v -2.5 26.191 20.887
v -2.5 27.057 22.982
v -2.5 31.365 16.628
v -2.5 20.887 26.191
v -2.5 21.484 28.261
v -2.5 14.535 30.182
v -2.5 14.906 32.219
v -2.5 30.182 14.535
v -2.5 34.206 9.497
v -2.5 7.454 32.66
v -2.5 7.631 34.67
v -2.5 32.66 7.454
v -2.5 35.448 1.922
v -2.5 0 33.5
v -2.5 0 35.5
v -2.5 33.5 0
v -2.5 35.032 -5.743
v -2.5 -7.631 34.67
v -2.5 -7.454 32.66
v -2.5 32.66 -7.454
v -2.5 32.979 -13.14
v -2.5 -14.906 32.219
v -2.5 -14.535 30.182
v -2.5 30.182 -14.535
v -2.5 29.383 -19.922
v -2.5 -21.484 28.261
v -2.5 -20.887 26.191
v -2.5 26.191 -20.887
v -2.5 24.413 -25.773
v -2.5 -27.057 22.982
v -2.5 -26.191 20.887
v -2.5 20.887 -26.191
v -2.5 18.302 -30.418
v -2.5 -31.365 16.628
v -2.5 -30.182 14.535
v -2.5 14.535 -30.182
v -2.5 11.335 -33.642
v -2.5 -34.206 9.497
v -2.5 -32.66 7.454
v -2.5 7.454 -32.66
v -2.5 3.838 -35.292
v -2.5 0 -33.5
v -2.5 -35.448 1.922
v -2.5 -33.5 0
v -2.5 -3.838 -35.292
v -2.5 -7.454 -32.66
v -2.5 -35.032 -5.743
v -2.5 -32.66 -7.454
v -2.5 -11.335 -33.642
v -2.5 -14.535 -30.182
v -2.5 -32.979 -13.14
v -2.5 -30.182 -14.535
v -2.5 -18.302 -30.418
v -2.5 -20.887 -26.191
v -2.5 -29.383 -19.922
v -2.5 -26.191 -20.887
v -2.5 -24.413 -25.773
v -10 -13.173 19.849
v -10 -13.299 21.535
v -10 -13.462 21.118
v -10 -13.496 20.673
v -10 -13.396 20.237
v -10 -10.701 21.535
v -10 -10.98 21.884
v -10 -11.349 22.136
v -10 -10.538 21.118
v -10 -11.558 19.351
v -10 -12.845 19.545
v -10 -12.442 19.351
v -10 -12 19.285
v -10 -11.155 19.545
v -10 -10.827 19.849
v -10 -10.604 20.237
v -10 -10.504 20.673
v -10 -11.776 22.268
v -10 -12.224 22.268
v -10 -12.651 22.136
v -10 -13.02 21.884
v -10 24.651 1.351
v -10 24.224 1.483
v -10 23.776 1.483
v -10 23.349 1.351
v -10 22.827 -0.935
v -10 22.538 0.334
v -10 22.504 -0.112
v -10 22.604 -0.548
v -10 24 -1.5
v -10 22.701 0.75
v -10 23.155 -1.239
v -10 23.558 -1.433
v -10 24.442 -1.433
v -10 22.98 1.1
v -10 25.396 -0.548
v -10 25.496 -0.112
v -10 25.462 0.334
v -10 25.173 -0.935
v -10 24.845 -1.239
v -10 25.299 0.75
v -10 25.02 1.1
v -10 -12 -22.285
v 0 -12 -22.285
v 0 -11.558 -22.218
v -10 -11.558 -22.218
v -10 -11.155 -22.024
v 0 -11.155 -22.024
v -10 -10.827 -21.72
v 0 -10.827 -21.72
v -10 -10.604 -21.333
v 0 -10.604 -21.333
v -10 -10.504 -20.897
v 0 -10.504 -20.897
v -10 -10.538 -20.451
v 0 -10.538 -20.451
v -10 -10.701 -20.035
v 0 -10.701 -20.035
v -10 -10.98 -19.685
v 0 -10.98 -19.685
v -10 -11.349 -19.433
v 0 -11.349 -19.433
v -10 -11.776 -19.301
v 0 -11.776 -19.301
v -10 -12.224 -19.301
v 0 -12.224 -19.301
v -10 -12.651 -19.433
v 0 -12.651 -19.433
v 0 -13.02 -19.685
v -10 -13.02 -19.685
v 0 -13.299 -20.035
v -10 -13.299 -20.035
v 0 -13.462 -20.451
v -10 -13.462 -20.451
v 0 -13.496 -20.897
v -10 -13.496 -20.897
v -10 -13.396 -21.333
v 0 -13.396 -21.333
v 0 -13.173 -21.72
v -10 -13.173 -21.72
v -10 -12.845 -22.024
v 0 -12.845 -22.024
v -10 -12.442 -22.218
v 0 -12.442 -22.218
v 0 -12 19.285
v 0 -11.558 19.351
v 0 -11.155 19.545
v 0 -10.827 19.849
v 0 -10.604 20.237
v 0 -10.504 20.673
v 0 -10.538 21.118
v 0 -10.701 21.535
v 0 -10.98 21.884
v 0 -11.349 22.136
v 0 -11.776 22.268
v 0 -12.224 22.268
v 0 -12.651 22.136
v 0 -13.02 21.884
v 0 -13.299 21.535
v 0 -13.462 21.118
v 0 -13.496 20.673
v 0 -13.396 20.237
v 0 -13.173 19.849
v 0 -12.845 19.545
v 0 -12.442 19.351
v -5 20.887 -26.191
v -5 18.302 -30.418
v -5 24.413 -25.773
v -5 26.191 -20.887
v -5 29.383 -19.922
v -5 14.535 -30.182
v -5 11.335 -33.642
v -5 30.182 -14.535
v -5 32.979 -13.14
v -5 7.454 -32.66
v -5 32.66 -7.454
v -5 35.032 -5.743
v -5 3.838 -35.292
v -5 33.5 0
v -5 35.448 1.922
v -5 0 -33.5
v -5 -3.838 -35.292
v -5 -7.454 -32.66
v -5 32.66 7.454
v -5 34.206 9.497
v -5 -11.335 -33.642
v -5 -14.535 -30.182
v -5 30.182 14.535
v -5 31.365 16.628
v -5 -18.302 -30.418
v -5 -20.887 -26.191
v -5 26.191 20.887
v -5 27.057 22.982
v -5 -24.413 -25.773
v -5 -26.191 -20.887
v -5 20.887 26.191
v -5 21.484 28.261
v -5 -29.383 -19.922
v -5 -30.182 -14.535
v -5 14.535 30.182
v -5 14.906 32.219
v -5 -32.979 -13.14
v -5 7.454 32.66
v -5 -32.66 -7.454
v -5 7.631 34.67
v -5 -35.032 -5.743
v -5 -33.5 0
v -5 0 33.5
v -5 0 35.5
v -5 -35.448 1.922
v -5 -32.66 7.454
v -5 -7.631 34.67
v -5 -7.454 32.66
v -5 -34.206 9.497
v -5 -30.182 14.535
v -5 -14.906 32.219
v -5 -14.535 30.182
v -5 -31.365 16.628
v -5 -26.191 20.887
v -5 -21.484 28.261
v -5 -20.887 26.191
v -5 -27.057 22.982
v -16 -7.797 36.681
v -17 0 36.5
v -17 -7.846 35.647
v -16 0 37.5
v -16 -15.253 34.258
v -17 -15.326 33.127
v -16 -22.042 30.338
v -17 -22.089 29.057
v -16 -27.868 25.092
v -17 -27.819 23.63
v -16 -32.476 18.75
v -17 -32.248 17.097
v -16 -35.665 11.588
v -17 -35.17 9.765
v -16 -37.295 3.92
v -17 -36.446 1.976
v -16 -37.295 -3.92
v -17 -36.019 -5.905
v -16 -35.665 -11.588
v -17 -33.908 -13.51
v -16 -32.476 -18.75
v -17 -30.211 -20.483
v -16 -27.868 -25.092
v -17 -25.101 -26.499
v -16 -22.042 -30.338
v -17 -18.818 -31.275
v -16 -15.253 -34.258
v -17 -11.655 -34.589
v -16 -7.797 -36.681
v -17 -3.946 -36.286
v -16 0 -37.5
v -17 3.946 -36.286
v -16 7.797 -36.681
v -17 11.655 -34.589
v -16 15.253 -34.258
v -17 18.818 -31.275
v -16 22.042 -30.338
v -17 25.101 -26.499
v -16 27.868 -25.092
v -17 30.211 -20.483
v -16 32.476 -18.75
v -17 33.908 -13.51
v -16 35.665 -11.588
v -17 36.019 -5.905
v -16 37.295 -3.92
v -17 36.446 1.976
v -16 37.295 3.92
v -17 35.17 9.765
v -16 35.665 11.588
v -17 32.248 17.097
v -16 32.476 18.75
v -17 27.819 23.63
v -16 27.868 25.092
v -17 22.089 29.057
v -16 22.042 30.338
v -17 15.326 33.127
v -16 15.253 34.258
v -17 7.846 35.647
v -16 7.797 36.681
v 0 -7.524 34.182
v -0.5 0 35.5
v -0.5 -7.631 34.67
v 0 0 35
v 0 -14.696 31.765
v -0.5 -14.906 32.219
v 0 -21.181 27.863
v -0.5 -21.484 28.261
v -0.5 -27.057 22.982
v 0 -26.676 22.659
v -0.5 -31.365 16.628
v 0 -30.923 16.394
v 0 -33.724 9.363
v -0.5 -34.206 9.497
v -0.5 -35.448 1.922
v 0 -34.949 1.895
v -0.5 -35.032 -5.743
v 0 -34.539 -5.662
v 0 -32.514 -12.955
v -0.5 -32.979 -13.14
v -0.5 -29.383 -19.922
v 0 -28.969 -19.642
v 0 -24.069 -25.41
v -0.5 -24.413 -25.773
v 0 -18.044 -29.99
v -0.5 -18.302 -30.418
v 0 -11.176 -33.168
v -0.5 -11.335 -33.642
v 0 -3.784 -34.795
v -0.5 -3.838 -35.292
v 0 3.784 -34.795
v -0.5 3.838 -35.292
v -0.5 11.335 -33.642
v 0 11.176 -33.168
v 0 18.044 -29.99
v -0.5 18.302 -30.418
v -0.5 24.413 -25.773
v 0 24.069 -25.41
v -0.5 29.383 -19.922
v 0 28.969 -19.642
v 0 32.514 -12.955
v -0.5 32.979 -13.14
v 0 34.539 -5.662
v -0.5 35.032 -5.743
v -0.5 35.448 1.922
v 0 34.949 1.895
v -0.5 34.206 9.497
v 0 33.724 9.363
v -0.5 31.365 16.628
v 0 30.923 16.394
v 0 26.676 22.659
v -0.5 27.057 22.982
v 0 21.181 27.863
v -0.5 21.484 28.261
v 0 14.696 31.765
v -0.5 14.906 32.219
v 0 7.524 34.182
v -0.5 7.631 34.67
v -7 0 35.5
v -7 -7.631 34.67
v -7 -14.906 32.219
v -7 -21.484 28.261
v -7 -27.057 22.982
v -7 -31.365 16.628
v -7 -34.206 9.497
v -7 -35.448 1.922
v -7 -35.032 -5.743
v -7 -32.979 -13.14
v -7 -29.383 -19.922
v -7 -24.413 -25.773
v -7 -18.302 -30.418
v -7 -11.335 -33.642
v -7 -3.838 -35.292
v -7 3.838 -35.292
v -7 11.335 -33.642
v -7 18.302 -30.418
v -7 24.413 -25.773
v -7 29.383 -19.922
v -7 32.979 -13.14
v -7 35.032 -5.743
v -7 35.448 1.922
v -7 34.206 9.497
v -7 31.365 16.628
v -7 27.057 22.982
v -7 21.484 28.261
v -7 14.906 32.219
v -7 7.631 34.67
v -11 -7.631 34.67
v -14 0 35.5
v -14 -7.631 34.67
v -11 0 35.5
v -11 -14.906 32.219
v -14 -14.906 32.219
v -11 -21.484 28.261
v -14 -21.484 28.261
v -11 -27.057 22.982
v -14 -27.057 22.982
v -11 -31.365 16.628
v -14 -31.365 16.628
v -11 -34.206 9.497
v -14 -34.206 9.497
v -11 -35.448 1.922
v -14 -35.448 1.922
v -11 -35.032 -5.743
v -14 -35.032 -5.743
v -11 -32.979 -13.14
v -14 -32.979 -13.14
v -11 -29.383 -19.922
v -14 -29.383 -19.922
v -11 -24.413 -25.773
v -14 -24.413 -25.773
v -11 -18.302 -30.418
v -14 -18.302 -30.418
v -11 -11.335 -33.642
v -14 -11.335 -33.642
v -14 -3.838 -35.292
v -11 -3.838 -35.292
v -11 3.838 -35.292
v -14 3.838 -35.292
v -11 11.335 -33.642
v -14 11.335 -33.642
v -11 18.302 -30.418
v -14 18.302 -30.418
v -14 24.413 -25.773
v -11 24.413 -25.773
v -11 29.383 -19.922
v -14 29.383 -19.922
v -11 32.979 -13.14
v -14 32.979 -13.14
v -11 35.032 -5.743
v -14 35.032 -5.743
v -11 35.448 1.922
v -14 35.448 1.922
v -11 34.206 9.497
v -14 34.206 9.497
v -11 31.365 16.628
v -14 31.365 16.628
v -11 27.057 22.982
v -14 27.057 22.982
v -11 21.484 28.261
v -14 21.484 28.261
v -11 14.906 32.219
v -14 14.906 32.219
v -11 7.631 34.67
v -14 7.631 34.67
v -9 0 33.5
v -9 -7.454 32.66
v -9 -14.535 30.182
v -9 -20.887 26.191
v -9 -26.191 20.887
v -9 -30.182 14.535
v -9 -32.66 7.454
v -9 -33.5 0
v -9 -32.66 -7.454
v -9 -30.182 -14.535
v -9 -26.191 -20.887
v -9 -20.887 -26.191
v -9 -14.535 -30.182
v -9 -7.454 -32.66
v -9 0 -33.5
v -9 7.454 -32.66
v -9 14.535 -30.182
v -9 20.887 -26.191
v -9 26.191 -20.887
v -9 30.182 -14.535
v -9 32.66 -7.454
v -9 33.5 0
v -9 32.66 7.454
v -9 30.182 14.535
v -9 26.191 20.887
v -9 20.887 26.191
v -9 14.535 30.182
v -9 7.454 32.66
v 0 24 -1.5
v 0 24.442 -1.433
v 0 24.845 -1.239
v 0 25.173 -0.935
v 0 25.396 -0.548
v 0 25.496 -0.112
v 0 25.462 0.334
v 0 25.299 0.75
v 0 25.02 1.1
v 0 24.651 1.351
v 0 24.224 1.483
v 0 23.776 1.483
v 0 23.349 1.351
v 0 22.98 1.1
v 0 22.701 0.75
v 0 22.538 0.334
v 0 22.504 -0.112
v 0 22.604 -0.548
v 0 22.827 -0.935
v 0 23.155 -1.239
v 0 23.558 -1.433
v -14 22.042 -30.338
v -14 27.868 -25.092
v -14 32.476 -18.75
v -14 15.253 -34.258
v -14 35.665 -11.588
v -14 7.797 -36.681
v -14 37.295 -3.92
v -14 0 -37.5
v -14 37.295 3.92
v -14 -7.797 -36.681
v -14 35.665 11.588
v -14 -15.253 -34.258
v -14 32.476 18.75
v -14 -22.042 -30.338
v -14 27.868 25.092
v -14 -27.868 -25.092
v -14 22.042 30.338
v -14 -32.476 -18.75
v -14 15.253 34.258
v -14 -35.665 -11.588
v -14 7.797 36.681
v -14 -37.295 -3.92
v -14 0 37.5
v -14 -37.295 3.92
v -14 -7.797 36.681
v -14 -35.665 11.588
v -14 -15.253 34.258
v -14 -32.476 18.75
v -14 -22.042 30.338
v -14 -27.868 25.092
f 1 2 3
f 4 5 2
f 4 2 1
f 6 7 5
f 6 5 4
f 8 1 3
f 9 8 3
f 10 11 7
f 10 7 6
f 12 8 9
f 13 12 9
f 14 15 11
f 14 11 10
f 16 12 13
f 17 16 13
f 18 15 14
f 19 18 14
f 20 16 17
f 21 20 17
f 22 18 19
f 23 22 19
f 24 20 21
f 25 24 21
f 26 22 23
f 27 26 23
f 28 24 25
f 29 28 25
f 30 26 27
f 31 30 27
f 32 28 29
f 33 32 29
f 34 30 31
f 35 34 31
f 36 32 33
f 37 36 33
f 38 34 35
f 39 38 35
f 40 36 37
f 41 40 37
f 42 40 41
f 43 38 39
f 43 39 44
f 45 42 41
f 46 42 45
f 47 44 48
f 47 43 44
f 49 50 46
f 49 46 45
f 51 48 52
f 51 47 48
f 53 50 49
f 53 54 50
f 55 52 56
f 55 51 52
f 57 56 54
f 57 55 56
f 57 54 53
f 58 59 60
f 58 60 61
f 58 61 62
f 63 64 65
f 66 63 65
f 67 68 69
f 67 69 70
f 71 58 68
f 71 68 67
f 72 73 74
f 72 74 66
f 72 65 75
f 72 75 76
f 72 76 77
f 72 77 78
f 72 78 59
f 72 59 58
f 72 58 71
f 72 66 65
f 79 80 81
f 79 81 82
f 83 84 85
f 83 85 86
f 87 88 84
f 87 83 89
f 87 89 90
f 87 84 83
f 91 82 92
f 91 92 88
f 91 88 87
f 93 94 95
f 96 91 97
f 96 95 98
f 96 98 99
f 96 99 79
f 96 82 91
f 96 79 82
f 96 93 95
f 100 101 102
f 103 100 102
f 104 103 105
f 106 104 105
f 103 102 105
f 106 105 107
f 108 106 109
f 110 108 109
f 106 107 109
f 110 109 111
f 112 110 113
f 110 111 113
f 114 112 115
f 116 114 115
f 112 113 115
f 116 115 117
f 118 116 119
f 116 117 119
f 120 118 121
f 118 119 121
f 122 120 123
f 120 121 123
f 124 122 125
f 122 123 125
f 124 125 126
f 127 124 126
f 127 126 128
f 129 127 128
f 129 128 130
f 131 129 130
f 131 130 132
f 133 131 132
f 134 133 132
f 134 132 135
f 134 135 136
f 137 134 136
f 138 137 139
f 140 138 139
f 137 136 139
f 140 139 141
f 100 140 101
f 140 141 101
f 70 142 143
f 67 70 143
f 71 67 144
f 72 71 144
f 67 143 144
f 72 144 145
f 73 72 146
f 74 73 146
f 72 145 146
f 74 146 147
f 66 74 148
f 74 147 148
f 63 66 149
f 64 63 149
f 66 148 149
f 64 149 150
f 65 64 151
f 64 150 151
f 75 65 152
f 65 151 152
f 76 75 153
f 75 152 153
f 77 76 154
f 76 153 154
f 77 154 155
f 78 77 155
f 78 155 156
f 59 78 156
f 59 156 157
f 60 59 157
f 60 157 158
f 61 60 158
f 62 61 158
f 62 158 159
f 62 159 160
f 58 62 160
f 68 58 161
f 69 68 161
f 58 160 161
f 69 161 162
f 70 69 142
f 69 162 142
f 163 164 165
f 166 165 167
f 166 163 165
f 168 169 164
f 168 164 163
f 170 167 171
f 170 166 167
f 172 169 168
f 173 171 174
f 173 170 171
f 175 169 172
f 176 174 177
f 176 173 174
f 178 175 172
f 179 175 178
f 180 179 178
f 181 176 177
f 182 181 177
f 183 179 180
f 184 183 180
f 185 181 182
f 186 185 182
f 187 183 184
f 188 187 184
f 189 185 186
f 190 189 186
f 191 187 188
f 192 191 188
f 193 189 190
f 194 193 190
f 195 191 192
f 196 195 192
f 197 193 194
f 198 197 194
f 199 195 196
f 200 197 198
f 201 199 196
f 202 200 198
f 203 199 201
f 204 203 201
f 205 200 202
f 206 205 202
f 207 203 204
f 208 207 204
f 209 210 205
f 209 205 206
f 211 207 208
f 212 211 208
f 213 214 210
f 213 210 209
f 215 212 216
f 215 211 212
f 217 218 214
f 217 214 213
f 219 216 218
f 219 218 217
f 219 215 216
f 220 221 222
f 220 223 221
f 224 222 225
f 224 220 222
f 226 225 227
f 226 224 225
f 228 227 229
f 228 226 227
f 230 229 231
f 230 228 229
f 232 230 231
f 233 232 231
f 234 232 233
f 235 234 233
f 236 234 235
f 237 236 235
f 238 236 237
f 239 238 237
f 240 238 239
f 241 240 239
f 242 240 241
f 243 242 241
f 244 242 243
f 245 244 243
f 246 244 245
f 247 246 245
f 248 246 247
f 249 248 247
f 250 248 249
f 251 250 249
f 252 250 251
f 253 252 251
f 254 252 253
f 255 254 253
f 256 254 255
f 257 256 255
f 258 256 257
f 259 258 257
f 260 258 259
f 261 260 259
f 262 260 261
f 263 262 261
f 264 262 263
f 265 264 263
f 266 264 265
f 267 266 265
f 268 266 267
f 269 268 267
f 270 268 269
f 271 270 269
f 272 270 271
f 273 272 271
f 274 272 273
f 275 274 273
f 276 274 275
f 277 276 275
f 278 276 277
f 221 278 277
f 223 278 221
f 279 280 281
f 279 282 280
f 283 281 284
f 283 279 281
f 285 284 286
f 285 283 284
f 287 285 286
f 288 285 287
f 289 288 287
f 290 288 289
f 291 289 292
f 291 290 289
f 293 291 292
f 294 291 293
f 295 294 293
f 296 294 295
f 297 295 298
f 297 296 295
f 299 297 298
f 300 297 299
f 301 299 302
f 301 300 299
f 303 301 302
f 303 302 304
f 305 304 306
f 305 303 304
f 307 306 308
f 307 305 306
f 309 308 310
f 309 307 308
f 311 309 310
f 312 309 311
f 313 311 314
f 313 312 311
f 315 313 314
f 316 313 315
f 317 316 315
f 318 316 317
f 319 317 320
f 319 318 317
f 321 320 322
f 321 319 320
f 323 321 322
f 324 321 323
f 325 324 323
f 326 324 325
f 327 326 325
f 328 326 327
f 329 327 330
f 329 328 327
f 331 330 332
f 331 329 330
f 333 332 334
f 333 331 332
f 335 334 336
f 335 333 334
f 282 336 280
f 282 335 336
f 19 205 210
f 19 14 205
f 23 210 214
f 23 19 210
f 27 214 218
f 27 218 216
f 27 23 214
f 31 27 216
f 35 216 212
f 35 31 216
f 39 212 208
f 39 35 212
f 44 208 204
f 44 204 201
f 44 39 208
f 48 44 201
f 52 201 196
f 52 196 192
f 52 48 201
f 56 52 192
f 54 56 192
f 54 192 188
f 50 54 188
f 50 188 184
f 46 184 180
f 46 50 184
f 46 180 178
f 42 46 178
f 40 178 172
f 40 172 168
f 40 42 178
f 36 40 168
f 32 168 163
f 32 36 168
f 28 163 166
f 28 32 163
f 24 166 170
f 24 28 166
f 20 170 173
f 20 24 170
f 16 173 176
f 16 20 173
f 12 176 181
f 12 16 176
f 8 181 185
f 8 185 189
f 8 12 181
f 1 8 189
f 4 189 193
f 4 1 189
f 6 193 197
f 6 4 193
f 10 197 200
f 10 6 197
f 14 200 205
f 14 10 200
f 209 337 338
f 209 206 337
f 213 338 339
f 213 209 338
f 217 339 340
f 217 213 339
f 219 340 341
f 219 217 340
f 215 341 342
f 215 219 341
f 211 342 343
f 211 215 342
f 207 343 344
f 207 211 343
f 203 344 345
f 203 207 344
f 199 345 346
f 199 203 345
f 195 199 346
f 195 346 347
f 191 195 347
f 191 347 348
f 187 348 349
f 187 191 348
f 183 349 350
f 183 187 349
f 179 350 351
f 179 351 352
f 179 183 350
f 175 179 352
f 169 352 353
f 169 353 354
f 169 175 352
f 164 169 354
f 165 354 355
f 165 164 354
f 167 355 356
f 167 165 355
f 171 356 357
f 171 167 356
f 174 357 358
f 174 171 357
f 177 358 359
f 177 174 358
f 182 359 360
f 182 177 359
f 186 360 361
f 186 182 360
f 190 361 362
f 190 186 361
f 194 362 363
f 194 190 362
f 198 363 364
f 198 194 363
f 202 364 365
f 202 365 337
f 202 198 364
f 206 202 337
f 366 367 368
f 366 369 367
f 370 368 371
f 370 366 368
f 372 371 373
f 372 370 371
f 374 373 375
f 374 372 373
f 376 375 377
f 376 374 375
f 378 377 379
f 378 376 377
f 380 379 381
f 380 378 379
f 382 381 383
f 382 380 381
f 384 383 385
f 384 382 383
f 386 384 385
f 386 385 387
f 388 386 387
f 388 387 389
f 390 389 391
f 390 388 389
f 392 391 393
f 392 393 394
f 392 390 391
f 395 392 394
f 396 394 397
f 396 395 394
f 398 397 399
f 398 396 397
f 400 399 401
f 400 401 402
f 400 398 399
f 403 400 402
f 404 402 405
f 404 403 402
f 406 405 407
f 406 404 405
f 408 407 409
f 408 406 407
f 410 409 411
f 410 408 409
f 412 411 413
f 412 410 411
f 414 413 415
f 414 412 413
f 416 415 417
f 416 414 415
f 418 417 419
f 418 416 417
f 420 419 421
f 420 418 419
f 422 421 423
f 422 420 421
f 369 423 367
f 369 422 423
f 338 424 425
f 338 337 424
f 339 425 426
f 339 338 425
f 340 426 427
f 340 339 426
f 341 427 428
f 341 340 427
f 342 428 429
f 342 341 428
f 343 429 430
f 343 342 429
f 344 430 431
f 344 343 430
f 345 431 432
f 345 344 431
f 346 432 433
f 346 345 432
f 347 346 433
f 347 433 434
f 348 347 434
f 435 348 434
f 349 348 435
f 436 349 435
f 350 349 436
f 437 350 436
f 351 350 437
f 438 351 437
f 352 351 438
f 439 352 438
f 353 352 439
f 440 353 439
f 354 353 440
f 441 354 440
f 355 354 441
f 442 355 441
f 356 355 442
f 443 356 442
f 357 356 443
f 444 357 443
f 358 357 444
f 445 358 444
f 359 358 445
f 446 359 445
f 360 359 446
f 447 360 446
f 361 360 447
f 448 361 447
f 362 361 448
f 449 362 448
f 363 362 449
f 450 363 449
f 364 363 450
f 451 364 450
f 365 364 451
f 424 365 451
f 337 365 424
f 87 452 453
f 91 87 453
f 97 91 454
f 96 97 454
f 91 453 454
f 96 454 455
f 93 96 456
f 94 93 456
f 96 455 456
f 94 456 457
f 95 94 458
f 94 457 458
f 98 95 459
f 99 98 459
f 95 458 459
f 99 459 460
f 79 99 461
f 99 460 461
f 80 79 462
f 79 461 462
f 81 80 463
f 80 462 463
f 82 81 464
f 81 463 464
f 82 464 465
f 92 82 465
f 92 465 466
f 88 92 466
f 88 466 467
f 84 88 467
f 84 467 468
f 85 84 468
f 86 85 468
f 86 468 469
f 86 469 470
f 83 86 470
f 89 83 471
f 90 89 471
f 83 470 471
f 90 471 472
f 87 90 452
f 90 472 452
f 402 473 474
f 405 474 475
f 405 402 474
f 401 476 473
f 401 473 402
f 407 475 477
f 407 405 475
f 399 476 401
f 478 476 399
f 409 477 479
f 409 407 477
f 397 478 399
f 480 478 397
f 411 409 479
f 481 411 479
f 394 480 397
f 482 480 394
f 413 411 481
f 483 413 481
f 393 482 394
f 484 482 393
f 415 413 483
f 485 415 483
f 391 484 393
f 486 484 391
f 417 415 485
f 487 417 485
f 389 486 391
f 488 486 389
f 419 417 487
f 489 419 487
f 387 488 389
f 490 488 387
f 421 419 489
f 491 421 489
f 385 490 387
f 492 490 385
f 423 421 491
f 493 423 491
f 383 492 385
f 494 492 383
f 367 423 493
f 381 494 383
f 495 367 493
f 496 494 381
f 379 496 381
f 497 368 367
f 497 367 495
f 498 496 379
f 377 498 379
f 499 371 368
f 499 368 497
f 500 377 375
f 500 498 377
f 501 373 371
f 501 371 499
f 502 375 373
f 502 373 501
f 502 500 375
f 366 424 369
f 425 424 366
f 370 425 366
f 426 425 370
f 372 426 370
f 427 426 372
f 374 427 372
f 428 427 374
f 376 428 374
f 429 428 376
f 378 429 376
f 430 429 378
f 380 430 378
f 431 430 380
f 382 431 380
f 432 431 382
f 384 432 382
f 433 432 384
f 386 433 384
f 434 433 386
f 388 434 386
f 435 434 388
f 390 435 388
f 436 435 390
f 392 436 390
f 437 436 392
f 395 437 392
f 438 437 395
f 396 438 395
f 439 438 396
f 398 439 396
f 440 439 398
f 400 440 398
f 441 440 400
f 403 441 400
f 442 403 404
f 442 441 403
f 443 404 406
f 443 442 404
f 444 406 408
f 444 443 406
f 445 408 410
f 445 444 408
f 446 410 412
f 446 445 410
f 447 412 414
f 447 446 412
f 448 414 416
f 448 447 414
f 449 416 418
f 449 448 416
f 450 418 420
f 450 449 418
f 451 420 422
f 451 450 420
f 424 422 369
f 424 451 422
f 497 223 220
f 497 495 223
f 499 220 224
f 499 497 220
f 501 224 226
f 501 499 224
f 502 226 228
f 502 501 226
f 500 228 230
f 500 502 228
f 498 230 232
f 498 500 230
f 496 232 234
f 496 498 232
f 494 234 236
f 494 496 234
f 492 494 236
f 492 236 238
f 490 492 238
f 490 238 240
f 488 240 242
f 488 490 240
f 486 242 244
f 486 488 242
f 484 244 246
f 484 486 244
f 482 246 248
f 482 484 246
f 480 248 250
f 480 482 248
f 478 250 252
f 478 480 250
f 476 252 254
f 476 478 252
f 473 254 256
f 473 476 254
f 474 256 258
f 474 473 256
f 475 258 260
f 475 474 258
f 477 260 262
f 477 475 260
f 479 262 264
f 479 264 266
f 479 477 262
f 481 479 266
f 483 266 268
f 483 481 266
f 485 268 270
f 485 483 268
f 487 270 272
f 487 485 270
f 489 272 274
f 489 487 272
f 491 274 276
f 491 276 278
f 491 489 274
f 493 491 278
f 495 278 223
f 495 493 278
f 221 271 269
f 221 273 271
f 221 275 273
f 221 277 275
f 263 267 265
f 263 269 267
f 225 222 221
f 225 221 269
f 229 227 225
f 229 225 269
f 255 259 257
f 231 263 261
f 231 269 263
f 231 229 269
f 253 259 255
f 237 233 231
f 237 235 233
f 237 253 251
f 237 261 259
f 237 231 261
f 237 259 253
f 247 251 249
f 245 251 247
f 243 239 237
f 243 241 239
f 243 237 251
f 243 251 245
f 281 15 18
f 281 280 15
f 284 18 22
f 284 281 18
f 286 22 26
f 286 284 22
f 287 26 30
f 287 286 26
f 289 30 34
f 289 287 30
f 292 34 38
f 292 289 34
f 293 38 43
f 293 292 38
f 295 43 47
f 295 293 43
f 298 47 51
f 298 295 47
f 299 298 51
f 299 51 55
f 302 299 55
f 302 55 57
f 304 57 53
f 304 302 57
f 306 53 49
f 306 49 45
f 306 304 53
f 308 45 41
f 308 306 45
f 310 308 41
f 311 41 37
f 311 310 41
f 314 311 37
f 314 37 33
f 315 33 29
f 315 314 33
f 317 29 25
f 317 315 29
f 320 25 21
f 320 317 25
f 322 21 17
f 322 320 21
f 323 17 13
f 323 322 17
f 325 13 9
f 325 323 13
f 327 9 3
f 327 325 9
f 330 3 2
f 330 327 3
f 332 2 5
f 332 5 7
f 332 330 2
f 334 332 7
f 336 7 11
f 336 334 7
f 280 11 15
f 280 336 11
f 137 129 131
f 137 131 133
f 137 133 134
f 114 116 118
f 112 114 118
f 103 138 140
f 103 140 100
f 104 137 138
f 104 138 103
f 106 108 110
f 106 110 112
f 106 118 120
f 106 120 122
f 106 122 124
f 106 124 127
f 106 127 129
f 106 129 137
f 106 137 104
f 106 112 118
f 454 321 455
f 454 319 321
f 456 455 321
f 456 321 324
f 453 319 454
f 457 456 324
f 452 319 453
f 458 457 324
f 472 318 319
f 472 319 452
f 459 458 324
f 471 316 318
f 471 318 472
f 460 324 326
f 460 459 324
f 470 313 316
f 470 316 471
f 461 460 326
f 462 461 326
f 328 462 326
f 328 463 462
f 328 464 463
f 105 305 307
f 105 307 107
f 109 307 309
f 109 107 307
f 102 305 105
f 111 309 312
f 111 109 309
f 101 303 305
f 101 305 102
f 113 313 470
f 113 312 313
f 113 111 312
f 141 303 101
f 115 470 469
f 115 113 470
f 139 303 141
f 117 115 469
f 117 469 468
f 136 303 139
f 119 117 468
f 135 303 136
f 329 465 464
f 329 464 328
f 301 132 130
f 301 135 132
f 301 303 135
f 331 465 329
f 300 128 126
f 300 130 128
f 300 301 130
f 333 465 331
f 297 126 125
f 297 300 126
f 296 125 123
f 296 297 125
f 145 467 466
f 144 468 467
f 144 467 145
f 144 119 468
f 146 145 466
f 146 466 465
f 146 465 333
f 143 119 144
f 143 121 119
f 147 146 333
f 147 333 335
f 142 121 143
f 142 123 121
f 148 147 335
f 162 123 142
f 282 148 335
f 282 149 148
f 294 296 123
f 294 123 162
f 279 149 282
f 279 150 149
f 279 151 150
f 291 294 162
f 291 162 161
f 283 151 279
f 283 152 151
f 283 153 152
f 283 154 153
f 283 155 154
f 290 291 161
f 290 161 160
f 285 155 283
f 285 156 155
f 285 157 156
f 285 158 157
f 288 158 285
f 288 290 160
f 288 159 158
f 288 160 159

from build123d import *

# Parameters (mm, degrees)
SKETCH_2_R          = 1.5
CUT_EXTRUDE_1_DEPTH = 10


with BuildPart() as part:
    # Эскиз1 → Повернуть1 (revolve)
    with BuildSketch(Plane.XY, mode=Mode.PRIVATE) as revolve_1_sk:
        Polygon((-17, 0), (-17, 36.5), (-16, 37.5), (-14, 37.5), (-14, 35.5), (-11, 35.5), (-9, 33.5), (-7, 35.5), (-5, 35.5), (-5, 33.5), (-2.5, 33.5), (-2.5, 35.5), (-0.5, 35.5), (0, 35), (0, 0), align=None)
    revolve(revolve_1_sk.sketch.rotate(Axis((0, 0, 0), (1, 0, 0)), 90), axis=Axis((0, 0, 0), (1, 0, 0)))

    # Эскиз2 → Вырез-Вытянуть1 (cut)
    with BuildSketch(Plane(origin=(0, 0, 0), x_dir=(0, 0, -1), z_dir=(1, 0, 0))):
        with Locations((20.784609691, -12)):
            Circle(SKETCH_2_R)
        with Locations((0, 24)):
            Circle(SKETCH_2_R)
        with Locations((-20.784609691, -12)):
            Circle(SKETCH_2_R)
    extrude(amount=-CUT_EXTRUDE_1_DEPTH, mode=Mode.SUBTRACT)


solid = part.part
